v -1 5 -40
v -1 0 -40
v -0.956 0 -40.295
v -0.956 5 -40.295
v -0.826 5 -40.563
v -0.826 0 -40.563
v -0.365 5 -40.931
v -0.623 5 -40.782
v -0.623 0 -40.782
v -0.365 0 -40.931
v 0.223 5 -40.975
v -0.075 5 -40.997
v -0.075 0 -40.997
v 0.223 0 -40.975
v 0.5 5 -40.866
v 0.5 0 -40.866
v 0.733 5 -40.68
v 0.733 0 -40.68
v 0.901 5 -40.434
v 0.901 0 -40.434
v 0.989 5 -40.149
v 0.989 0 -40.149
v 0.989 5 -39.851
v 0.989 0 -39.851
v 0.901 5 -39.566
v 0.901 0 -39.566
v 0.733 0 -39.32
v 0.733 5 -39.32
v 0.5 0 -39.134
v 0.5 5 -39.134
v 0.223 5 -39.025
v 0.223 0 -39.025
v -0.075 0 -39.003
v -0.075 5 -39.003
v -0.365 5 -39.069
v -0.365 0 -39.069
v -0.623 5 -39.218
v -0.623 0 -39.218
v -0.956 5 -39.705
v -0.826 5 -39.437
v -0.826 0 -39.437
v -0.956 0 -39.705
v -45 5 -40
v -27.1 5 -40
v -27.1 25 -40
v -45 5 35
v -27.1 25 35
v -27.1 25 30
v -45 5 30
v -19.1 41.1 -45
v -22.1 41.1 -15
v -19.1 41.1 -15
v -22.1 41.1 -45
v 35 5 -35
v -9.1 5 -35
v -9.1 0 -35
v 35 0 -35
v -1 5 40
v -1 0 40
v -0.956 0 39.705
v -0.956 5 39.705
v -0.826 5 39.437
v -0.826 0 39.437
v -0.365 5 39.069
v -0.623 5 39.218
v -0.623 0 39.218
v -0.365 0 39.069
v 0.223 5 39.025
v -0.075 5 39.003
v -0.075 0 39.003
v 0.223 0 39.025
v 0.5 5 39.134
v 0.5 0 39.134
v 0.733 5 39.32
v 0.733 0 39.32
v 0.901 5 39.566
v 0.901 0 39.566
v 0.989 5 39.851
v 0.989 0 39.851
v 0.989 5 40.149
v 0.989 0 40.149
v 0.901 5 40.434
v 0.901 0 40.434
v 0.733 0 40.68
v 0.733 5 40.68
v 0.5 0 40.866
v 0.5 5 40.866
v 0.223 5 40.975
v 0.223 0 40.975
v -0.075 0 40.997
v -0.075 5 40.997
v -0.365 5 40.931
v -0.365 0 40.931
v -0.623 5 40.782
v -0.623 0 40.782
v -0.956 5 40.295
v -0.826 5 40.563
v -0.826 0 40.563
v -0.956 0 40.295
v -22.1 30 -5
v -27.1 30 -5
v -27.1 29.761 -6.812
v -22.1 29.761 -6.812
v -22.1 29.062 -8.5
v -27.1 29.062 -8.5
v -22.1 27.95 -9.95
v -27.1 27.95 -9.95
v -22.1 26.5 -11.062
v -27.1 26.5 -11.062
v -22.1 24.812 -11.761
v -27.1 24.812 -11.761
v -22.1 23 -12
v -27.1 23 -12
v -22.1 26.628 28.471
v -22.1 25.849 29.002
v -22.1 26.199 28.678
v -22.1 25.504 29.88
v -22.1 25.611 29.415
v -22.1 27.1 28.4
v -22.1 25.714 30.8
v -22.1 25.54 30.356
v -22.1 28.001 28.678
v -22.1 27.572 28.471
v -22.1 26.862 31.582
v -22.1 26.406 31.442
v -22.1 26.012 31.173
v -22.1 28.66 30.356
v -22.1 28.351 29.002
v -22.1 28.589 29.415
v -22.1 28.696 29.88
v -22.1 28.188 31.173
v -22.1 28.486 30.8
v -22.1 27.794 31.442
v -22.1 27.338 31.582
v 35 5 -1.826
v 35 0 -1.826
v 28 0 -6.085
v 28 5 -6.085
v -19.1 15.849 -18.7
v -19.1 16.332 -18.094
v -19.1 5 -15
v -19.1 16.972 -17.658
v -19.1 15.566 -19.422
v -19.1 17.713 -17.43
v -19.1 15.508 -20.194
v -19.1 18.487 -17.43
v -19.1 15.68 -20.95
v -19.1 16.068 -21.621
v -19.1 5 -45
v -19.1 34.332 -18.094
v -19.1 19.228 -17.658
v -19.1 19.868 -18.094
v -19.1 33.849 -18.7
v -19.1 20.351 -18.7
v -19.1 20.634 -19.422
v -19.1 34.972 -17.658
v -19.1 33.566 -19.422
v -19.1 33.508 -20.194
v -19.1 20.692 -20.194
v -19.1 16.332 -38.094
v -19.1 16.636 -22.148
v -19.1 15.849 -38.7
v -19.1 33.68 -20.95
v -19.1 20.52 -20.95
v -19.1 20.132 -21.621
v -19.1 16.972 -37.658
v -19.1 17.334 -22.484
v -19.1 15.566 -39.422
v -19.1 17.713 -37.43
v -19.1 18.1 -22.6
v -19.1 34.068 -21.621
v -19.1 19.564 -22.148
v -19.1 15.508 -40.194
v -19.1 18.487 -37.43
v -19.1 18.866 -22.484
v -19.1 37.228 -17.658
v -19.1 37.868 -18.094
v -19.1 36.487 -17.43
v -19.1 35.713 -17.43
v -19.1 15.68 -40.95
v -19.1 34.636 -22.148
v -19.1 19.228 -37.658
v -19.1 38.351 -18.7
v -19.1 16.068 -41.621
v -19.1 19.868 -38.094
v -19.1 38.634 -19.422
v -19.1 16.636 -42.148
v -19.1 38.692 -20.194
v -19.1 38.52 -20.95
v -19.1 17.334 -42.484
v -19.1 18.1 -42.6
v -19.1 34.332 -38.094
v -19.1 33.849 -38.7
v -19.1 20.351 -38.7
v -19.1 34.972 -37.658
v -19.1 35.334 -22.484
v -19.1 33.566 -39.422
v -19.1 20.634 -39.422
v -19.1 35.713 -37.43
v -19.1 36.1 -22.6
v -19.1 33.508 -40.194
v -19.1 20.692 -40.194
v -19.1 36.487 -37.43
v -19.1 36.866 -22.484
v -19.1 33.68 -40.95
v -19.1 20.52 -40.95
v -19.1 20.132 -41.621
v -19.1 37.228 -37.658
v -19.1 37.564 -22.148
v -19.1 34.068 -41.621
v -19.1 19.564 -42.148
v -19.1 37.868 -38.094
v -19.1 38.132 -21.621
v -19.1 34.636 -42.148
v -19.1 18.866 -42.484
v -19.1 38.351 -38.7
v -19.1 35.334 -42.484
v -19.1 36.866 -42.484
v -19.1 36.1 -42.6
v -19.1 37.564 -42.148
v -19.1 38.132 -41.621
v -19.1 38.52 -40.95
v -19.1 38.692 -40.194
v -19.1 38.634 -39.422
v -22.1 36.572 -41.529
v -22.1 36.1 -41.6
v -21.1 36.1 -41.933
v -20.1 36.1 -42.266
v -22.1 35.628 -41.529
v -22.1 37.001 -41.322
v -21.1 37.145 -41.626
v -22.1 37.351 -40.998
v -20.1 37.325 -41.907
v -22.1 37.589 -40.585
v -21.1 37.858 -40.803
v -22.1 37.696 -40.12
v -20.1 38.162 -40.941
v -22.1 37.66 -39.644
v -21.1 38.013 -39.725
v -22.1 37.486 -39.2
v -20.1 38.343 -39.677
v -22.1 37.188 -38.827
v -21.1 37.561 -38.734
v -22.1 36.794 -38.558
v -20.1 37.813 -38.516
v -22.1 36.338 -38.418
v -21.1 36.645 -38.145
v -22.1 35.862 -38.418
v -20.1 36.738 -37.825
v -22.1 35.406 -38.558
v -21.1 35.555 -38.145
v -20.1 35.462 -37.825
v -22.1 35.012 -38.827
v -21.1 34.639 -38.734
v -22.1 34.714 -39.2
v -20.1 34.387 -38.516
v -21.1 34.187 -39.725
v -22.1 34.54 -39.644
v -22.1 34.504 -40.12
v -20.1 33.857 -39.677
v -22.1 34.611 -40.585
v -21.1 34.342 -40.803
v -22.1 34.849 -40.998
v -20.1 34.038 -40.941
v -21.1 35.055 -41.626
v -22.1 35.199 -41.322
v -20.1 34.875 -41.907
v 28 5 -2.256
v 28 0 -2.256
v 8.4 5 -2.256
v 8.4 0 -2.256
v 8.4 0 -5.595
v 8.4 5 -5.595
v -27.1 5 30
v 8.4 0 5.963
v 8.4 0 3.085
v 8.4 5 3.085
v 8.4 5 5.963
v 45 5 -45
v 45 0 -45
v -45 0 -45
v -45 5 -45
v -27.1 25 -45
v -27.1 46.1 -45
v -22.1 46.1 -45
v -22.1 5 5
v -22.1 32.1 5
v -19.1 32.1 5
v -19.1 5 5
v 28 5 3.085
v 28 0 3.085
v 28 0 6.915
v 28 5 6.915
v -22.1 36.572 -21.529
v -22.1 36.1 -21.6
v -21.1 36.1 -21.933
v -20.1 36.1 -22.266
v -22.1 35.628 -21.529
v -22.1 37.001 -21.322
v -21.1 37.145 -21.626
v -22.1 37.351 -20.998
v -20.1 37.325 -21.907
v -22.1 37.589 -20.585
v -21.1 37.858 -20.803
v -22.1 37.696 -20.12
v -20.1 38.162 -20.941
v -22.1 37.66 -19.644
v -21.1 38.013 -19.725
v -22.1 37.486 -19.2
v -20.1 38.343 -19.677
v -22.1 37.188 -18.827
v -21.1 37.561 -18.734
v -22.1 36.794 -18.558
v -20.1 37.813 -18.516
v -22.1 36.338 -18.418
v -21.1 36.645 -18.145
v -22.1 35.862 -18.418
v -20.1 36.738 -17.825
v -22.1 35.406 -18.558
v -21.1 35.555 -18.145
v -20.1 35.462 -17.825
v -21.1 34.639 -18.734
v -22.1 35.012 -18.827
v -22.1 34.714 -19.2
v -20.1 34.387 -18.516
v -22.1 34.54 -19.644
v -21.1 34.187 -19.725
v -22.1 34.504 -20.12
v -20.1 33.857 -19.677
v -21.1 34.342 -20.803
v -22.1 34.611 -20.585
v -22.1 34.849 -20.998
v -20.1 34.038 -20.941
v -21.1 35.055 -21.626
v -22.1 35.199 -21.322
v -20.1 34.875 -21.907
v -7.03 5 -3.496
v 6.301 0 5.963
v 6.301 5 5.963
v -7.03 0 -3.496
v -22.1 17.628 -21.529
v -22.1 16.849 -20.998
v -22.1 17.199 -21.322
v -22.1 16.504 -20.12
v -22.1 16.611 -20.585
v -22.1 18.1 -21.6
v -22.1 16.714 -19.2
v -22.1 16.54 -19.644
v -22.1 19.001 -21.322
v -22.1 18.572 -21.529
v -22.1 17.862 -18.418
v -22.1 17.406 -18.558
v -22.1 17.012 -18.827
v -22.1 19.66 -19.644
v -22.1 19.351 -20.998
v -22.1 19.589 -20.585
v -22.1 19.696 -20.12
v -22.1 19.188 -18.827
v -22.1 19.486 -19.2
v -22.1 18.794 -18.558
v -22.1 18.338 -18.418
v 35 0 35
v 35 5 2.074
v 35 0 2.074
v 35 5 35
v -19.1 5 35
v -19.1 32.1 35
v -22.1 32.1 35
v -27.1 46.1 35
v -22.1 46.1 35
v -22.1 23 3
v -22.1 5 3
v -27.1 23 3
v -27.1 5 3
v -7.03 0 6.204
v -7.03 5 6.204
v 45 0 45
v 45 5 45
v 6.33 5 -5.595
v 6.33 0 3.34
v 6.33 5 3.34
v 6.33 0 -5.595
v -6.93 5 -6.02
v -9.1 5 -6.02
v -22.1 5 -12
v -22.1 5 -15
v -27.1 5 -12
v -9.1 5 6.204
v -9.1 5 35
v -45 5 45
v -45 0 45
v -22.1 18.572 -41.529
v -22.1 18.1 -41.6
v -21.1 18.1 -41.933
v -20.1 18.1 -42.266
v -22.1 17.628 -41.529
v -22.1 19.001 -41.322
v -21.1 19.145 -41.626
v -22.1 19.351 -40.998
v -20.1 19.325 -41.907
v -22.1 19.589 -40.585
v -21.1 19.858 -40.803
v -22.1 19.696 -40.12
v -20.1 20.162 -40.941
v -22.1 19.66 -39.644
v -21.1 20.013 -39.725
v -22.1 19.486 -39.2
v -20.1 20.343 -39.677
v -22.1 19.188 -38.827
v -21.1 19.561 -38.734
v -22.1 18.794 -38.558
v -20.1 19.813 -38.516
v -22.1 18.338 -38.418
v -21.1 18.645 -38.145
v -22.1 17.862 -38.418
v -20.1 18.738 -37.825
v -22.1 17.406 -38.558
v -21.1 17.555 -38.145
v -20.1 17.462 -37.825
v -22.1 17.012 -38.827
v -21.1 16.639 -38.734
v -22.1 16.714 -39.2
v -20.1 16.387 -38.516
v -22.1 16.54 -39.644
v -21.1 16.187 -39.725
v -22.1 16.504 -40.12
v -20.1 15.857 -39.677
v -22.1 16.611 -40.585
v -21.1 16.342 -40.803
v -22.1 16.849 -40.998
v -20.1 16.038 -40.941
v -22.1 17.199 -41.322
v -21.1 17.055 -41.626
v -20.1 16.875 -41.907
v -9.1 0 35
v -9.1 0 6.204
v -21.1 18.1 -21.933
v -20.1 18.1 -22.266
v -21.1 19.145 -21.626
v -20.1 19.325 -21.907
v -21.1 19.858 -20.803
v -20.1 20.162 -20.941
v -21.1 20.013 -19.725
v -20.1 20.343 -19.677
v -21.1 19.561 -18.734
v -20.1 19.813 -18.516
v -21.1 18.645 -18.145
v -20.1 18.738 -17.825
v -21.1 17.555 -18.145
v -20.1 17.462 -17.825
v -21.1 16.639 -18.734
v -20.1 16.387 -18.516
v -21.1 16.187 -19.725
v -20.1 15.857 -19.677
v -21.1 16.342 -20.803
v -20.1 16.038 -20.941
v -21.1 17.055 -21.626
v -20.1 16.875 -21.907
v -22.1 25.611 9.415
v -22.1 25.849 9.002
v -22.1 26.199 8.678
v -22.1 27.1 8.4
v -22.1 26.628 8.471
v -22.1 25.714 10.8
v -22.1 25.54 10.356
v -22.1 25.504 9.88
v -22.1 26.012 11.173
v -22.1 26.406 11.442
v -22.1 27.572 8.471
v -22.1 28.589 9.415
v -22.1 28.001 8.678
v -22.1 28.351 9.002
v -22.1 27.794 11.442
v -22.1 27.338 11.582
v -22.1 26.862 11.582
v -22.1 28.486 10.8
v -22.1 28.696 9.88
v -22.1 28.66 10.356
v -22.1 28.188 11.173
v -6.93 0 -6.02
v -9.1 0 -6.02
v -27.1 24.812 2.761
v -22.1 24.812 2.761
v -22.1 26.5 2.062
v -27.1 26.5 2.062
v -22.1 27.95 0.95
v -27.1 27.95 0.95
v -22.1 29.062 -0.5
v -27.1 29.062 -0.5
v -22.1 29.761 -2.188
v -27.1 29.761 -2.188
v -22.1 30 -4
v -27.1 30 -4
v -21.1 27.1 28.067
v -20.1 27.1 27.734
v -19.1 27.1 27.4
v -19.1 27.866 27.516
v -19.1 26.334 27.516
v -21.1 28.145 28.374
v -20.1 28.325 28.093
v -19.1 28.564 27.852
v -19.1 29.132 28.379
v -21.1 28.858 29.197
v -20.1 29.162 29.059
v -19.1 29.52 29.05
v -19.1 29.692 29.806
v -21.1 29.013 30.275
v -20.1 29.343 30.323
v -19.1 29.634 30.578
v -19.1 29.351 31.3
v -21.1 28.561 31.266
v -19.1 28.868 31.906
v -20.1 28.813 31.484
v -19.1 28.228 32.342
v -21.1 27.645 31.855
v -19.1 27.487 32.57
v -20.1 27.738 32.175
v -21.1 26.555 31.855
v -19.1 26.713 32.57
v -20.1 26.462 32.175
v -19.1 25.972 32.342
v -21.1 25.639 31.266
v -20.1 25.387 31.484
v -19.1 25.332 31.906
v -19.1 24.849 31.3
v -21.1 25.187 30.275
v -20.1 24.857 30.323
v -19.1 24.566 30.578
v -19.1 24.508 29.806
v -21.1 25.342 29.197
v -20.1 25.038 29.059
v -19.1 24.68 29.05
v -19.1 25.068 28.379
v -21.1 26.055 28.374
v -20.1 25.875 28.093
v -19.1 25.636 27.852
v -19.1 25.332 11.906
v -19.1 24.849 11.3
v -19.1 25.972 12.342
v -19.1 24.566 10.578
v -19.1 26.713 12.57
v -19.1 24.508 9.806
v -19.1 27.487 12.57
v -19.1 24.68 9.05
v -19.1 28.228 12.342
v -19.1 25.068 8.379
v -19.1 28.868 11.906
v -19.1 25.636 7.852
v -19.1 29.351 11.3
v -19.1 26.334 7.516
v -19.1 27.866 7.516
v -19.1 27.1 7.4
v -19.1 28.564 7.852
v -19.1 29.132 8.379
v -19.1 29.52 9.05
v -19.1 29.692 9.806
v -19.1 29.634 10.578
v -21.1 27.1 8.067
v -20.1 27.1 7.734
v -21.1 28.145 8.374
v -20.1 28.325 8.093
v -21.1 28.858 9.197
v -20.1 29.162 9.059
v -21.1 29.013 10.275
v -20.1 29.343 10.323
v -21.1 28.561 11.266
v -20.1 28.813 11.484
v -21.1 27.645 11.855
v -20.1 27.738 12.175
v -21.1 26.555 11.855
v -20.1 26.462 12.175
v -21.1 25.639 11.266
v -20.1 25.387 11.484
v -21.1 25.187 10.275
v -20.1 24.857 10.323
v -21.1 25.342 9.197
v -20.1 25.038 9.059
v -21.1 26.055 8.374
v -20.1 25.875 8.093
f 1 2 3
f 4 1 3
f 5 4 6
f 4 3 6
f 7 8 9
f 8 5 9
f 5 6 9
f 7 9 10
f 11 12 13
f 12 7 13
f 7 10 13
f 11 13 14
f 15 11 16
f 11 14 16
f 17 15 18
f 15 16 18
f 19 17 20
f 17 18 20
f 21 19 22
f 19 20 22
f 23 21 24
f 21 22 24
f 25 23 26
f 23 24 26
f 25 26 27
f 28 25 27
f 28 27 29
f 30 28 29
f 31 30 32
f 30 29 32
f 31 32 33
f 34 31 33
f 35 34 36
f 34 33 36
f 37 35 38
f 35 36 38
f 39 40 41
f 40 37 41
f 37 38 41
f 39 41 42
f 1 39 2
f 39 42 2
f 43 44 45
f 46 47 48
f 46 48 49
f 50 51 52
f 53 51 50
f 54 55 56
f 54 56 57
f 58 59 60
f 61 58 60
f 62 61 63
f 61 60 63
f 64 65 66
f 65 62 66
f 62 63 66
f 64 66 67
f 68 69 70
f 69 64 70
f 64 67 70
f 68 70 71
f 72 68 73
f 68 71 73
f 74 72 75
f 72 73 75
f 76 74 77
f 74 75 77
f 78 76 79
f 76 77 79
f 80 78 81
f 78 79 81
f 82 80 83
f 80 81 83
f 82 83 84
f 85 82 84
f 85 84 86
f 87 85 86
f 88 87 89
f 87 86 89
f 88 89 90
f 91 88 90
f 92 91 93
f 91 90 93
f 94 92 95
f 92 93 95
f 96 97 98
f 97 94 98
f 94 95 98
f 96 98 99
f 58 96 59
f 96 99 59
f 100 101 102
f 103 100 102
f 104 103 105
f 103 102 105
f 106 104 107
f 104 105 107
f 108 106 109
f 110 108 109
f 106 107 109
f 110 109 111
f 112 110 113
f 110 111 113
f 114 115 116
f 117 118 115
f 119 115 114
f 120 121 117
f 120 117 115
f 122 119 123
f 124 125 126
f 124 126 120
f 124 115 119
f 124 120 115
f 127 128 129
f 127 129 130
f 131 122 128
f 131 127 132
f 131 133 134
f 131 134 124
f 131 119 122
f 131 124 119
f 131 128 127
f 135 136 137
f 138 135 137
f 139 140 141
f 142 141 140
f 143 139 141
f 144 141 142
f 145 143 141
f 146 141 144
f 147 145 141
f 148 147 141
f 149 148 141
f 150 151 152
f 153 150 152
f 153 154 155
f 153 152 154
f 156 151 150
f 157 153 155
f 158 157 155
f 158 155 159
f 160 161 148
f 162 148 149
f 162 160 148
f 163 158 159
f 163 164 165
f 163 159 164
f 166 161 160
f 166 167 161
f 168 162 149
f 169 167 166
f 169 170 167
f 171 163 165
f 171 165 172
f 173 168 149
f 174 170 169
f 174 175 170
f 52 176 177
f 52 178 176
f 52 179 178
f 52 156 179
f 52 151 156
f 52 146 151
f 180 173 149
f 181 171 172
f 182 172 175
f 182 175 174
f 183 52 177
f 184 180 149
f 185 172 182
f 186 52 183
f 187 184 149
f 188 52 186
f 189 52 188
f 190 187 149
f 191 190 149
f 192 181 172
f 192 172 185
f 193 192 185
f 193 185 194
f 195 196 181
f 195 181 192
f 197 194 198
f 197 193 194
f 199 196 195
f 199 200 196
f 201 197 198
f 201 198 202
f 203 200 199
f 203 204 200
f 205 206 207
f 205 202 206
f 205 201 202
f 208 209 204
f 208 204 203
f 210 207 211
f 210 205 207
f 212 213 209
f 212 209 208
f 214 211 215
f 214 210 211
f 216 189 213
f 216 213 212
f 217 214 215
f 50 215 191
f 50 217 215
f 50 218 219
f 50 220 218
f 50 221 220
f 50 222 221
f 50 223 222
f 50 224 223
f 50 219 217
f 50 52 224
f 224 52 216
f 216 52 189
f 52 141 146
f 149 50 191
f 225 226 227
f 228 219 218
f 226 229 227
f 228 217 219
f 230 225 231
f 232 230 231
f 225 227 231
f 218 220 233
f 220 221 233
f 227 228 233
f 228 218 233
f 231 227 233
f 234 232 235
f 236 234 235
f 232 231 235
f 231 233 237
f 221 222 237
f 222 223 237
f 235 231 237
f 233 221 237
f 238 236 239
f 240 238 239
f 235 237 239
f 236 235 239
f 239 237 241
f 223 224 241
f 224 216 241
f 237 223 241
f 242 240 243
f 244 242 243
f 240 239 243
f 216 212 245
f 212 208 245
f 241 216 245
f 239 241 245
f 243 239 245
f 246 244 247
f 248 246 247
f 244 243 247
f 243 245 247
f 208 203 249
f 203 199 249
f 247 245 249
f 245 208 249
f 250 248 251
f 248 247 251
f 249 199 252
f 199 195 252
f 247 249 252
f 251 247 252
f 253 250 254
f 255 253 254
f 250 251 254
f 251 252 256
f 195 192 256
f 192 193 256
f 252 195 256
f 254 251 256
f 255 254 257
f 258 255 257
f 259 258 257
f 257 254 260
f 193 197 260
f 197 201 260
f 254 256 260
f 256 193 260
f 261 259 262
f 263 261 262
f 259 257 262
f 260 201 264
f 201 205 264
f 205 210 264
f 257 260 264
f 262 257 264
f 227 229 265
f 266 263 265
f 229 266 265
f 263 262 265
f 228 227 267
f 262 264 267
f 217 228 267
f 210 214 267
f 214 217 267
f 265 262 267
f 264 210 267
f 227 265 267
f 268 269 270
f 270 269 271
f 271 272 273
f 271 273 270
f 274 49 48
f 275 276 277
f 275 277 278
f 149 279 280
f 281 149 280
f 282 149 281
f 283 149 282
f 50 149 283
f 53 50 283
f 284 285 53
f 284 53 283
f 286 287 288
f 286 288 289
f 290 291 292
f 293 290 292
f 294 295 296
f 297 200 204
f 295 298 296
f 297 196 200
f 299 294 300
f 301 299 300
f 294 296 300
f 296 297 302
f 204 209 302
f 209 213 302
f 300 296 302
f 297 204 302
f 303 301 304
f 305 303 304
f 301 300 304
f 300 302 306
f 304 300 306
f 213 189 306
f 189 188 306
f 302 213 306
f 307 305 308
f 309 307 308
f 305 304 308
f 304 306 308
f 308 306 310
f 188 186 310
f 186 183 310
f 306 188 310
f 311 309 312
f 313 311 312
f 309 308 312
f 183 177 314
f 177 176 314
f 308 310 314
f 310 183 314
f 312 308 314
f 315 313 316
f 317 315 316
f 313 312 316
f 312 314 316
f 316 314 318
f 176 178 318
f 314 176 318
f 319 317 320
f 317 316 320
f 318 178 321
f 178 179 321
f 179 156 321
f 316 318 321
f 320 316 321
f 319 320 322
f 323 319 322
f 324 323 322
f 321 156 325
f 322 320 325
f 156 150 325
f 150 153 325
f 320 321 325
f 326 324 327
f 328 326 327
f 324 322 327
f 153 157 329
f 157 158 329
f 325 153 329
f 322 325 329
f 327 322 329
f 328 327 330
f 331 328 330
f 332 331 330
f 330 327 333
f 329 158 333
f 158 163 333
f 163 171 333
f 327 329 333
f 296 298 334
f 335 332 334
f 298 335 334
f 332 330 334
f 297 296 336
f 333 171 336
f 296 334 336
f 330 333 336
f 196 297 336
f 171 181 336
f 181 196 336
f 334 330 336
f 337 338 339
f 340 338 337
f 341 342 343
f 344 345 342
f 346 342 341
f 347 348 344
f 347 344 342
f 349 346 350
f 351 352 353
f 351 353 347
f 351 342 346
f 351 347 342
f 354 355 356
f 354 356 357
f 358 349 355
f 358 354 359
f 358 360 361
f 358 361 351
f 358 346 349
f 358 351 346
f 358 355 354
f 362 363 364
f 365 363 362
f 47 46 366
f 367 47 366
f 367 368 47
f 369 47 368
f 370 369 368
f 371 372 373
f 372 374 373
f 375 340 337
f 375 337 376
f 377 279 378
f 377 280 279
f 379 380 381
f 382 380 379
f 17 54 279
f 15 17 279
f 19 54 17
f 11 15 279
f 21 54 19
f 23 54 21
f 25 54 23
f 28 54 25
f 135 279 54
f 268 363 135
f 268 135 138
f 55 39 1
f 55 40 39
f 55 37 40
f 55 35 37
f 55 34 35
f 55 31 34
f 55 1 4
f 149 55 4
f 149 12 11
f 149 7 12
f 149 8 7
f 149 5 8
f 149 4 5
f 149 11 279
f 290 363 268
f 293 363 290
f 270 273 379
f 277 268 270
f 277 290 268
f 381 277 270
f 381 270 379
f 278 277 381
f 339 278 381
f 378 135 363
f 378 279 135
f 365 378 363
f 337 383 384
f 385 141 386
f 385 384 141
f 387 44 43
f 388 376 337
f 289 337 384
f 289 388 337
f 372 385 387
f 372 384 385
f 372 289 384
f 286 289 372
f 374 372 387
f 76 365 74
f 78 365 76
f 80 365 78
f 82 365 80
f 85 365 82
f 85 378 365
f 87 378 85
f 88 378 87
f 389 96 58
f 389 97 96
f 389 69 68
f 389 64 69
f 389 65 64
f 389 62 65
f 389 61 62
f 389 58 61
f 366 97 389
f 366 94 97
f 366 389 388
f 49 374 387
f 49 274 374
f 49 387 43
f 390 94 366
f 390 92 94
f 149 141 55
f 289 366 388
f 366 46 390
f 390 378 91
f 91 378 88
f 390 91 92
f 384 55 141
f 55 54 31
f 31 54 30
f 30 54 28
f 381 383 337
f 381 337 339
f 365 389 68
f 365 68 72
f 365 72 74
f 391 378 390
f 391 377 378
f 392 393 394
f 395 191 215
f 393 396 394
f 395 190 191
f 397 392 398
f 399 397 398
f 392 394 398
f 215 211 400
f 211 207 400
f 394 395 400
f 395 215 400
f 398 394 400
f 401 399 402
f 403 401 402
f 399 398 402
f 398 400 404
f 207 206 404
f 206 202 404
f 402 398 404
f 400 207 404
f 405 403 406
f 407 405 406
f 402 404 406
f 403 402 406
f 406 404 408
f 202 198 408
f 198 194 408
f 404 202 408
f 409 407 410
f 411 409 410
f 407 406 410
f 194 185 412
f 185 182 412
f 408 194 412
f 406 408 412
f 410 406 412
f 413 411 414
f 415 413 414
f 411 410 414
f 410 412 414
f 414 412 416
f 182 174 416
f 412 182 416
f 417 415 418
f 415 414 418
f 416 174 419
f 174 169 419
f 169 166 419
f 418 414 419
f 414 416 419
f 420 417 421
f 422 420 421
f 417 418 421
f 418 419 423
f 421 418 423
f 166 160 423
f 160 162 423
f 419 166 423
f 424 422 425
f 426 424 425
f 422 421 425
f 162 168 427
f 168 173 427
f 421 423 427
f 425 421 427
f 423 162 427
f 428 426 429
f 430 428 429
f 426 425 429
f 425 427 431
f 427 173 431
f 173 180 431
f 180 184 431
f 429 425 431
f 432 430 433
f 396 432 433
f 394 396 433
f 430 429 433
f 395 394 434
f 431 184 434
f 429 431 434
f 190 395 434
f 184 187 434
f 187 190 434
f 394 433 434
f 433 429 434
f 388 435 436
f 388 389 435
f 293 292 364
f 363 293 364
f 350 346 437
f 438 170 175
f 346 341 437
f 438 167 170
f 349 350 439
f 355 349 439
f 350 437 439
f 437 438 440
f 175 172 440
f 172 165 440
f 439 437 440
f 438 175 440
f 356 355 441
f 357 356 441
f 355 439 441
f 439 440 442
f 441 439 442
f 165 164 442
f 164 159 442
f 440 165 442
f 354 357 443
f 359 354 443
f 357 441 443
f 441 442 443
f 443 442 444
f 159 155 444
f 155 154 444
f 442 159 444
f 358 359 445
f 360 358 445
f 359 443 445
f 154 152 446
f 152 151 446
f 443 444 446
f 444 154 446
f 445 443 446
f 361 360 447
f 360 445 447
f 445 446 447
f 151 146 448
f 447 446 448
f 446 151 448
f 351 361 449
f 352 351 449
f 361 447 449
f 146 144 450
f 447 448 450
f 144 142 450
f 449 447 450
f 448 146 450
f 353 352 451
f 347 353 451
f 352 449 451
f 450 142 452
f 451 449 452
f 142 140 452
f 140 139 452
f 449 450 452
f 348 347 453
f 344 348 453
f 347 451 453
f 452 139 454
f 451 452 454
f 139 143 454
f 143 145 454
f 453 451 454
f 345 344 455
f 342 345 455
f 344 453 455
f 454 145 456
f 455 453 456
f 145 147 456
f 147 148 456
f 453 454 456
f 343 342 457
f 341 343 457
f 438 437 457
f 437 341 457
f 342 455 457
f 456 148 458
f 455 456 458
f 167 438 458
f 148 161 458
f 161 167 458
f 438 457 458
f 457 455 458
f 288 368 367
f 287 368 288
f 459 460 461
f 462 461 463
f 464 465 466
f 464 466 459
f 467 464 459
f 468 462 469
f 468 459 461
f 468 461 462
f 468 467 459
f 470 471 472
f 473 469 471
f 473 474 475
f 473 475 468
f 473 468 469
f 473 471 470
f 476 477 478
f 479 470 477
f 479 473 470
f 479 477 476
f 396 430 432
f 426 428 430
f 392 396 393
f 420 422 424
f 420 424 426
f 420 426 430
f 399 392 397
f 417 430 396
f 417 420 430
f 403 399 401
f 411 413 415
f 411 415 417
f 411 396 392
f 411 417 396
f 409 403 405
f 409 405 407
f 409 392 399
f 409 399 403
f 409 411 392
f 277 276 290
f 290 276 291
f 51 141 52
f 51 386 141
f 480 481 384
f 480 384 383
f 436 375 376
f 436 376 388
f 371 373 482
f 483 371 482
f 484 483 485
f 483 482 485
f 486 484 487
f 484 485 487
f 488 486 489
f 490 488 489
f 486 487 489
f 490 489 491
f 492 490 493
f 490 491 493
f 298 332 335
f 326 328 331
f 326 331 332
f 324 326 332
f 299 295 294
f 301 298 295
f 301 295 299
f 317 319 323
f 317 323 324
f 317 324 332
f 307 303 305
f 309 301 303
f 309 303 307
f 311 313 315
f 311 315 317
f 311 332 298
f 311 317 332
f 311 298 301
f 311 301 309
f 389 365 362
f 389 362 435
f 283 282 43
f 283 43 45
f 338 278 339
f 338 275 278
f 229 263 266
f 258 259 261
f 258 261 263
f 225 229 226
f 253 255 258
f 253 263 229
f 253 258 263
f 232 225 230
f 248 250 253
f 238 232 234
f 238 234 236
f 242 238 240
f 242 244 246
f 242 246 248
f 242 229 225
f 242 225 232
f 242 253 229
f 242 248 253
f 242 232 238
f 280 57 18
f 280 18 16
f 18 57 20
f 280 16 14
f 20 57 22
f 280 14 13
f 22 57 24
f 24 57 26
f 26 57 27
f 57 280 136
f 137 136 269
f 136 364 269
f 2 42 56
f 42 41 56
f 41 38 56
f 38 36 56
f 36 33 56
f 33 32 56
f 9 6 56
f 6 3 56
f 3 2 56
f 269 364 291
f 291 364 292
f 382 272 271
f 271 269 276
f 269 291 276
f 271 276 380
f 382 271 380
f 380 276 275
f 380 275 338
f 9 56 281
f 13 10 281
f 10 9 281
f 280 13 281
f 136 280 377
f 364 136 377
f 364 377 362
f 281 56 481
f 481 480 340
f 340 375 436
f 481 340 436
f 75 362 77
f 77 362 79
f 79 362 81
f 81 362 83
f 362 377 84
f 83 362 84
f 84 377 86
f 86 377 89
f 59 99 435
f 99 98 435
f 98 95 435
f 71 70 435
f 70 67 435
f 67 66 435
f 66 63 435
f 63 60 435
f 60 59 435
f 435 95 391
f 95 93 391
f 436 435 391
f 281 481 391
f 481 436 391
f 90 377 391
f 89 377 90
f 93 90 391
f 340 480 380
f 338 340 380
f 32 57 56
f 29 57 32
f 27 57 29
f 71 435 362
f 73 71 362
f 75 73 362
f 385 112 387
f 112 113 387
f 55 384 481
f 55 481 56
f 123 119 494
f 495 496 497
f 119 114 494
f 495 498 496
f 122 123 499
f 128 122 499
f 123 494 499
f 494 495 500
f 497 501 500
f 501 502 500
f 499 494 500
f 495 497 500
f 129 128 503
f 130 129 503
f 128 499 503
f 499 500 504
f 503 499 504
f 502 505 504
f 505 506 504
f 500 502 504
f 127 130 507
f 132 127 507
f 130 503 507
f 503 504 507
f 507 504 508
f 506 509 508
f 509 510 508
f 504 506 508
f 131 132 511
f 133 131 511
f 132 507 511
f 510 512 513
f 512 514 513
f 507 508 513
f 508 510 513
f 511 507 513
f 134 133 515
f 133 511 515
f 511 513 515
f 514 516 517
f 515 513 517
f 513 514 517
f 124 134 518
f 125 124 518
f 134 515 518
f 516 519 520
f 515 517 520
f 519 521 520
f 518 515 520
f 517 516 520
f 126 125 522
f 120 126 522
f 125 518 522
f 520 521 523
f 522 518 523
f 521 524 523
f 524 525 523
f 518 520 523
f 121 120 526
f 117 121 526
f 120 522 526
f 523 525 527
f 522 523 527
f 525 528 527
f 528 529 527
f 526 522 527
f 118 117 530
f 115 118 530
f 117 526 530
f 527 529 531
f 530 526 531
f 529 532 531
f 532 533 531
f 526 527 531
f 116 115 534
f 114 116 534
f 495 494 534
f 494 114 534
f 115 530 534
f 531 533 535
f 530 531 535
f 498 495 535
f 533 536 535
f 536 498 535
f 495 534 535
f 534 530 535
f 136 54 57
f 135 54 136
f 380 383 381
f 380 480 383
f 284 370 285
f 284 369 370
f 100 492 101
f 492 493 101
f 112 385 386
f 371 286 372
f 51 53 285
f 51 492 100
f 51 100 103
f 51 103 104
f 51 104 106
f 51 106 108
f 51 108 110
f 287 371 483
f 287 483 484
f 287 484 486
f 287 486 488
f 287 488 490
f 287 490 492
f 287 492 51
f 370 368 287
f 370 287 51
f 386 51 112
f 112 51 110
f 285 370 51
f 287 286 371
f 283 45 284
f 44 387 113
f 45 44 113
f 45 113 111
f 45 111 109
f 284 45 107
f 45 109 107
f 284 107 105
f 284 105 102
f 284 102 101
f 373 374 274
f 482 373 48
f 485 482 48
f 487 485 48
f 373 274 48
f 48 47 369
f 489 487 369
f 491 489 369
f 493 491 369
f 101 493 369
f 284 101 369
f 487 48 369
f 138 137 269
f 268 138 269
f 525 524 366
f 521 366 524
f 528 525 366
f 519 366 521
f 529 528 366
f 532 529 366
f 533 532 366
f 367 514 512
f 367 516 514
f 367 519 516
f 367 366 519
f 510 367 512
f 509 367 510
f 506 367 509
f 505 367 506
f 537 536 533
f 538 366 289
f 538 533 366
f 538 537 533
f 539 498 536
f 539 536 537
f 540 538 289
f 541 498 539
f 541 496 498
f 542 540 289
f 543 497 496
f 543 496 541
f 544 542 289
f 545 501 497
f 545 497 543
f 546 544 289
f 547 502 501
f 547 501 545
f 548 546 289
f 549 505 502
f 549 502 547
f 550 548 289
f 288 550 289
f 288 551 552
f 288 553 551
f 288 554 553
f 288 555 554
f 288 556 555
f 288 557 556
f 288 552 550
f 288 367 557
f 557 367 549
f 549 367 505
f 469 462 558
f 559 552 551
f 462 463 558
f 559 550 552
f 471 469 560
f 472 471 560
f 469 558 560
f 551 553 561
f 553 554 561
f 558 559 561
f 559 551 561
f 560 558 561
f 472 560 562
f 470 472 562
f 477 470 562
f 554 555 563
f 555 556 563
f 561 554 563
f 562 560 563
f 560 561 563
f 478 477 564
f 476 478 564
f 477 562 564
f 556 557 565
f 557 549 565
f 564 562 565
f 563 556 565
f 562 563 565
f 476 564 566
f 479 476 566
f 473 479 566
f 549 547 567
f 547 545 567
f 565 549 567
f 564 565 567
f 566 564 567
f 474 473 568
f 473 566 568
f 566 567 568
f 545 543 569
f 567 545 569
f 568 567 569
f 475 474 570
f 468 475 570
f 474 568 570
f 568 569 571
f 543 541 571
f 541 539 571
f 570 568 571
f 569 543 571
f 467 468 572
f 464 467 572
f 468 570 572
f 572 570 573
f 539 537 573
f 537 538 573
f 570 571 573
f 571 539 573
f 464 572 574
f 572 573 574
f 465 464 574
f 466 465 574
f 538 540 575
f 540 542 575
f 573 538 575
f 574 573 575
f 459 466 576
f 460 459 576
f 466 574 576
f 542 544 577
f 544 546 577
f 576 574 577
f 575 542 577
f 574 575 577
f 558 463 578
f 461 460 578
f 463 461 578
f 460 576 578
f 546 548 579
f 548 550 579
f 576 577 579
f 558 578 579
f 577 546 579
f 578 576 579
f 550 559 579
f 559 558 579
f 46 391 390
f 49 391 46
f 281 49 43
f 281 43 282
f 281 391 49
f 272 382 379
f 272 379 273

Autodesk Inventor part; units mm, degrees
ref_plane "Arbeitsebene2" through (-75, 27.1, 0) normal (0, 0, 1) x (0, 1, 0)
sketch "center1" plane through (-75, 27.1, 0) normal (0, 0, 1) x (0, 1, 0)
  line L0 (-173.891, -75) -> (168.1592, -75)
  line L1 (0, 344.1359) -> (0, -385.7952)
  point P0 (-27.1, -75)
ref_plane "Arbeitsebene3" through (0, 99.4, -2.4) normal (-1, 0, 0) x (0, 0, 1)
sketch "center2" plane through (0, 99.4, -2.4) normal (-1, 0, 0) x (0, 0, 1)
  line L0 (184.8129, -72.3) -> (-258.9785, -72.3)
  point P0 (2.4, -99.4)
sketch "Groundplane" plane through (0, 0, 0) normal (0, 1, 0) x (-1, 0, 0)
  line L0 (45, 45) -> (-45, 45) construction
  line L1 (-45, 45) -> (-45, -45) construction
  line L2 (-45, -45) -> (45, -45) construction
  line L3 (45, -45) -> (45, 45) construction
  line L4 (1, 45) -> (-1, 45) construction
  line L5 (-1, 45) -> (-1, 40) construction
  line L6 (-1, 40) -> (1, 40) construction
  line L7 (1, 40) -> (1, 45) construction
  arc A0 (-1, 40) -> (1, 40) centre (0, 40) ccw construction
  line L8 (1, -45) -> (-1, -45) construction
  line L9 (-1, -45) -> (-1, -40) construction
  line L10 (-1, -40) -> (1, -40) construction
  line L11 (1, -40) -> (1, -45) construction
  arc A1 (1, -40) -> (-1, -40) centre (0, -40) ccw construction
  line L12 (0, -350.1368) -> (0, 271.1712) projected
  point P0 (0, 0)
  point P1 (0, -45)
  dimension "d5" = 2
  dimension "d6" = 5
  dimension "d7" = 2
  dimension "d8" = 5
  dimension "d9" = 90
  dimension "d63" = 90
  dimension "d76" = 45
sketch "Hallsensor" plane through (0, 0, 0) normal (1, 0, 0) x (0, 1, 0)
  line L0 (22.1, 0) -> (32.1, 0) construction
  line L1 (32.1, 0) -> (32.1, 20) construction
  line L2 (32.1, 20) -> (22.1, 20) construction
  line L3 (22.1, 20) -> (22.1, 0) construction
  line L4 (27.1, 182.4129) -> (27.1, -261.3785) construction
  line L5 (-146.791, 0) -> (195.2592, 0) construction
  line L6 (31.1, 1) -> (33.1, 1)
  line L7 (33.1, 1) -> (33.1, -1)
  line L8 (33.1, -1) -> (31.1, -1)
  line L9 (31.1, -1) -> (31.1, 1)
  line L10 (31.1, 1) -> (33.1, -1) construction
  line L11 (33.1, 1) -> (31.1, -1) construction
  line L12 (21.1, 1) -> (23.1, 1)
  line L13 (23.1, 1) -> (23.1, -1)
  line L14 (23.1, -1) -> (21.1, -1)
  line L15 (21.1, -1) -> (21.1, 1)
  line L16 (21.1, 1) -> (23.1, -1) construction
  line L17 (23.1, 1) -> (21.1, -1) construction
  line L18 (31.1, 21) -> (33.1, 21)
  line L19 (33.1, 21) -> (33.1, 19)
  line L20 (33.1, 19) -> (31.1, 19)
  line L21 (31.1, 19) -> (31.1, 21)
  line L22 (31.1, 21) -> (33.1, 19) construction
  line L23 (33.1, 21) -> (31.1, 19) construction
  line L24 (21.1, 21) -> (23.1, 21)
  line L25 (23.1, 21) -> (23.1, 19)
  line L26 (23.1, 19) -> (21.1, 19)
  line L27 (21.1, 19) -> (21.1, 21)
  line L28 (21.1, 21) -> (23.1, 19) construction
  line L29 (23.1, 21) -> (21.1, 19) construction
  line L30 (36.1, 30) -> (18.1, 30) construction
  line L31 (18.1, 30) -> (18.1, -20) construction
  line L32 (18.1, -20) -> (36.1, -20) construction
  line L33 (36.1, -20) -> (36.1, 30) construction
  circle A0 centre (27.1, 30) radius 1.6
  circle A1 centre (36.1, -20) radius 1.6
  circle A2 centre (18.1, -20) radius 1.6
  point P0 (0, 0)
  dimension "d127" = 20
  dimension "d128" = 5
  dimension "d129" = 5
  dimension "d130" = 2
  dimension "d131" = 20
  dimension "d132" = 4
  dimension "d133" = 4
  dimension "d134" = 10
  dimension "d135" = 3.2
ref_plane "Arbeitsebene1" through (-27.1, 0, 0) normal (1, 0, 0) x (0, 1, 0)
sketch "Montagepunkte" plane through (-27.1, 0, 0) normal (1, 0, 0) x (0, 1, 0)
  line L0 (27.1, 10) -> (27.1, -45.0561) construction
  line L1 (46.1, -45) -> (0, -45)
  line L2 (0, -45) -> (0, 35)
  line L3 (0, 35) -> (46.1, 35)
  line L4 (46.1, 35) -> (46.1, -45)
  circle A0 centre (36.1, -20) radius 1.6 projected
  circle A1 centre (18.1, -20) radius 1.6 projected
  circle A2 centre (27.1, 30) radius 1.6 projected
  line L5 (36.1, -20) -> (18.1, -20) construction
  line L6 (18.1, -20) -> (18.1, -40) construction
  line L7 (18.1, -40) -> (36.1, -40) construction
  line L8 (36.1, -40) -> (36.1, -20) construction
  line L9 (27.1, 30) -> (27.1, 10) construction
  circle A3 centre (27.1, 10) radius 1.6
  circle A4 centre (36.1, -40) radius 1.6
  circle A5 centre (18.1, -40) radius 1.6
  point P0 (0, 0)
  point P1 (0, 0)
  point P2 (1.45, 0)
  dimension "d136" = 20
  dimension "d137" = 20
  dimension "d138" = 3.2
  dimension "d139" = 5
  dimension "d140" = 5
  dimension "d141" = 10
sketch "Skizze10" plane through (-27.1, 0, 0) normal (1, 0, 0) x (0, 1, 0)
  line L0 (46.1, -45) -> (0, -45) projected
  line L1 (0, -45) -> (0, 35) projected
  line L2 (0, 35) -> (46.1, 35) projected
  line L3 (46.1, 35) -> (46.1, -45) projected
  point P0 (0, 0)
extrude "Extrusion5" add sketch "Skizze10" along normal blind 5
sketch "Skizze11" plane through (-22.1, 0, 0) normal (1, 0, 0) x (0, 0, -1)
  line L0 (-35, 0) -> (45, 0) projected
  circle A0 centre (40, 36.1) radius 1.6 projected
  circle A1 centre (20, 36.1) radius 1.6 projected
  circle A2 centre (20, 18.1) radius 1.6 projected
  circle A3 centre (40, 18.1) radius 1.6 projected
  circle A4 centre (-10, 27.1) radius 1.6 projected
  circle A5 centre (-30, 27.1) radius 1.6 projected
  line L1 (-35, 32.1) -> (-5, 32.1)
  line L2 (-5, 32.1) -> (-5, 0)
  line L3 (-5, 0) -> (-35, 0)
  line L4 (-35, 0) -> (-35, 32.1)
  line L5 (15, 41.1) -> (45, 41.1)
  line L6 (45, 41.1) -> (45, 0)
  line L7 (45, 0) -> (15, 0)
  line L8 (15, 0) -> (15, 41.1)
  point P0 (0, 0)
  dimension "d142" = 5
  dimension "d143" = 5
  dimension "d144" = 5
  dimension "d145" = 5
  dimension "d146" = 5
  dimension "d147" = 5
extrude "Extrusion6" add sketch "Skizze11" along normal blind 3
chamfer "Fase3" distance 1 distance2 3 4 edges at (-19.1, 36.1, -18.4) (-19.1, 36.1, -38.4) (-19.1, 18.1, -38.4) (-19.1, 18.1, -18.4) measured on face at (-19.1, 5.5944, -26.9696)
chamfer "Fase4" distance 1 distance2 3 2 edges at (-19.1, 27.1, 31.6) (-19.1, 27.1, 11.6) measured on face at (-19.1, 8.5944, 16.9696)
sketch "Skizze12" plane through (0, 0, 0) normal (0, 1, 0) x (-1, 0, 0)
  line L0 (-45, 45) -> (-45, -45) construction
  line L1 (-45, -45) -> (45, -45) construction
  line L2 (45, -45) -> (45, 45) construction
  line L3 (45, 45) -> (-45, 45) construction
  arc A0 (1, -40) -> (-1, -40) centre (0, -40) ccw construction
  arc A1 (-1, 40) -> (1, 40) centre (0, 40) ccw construction
  circle A2 centre (0, 40) radius 1
  circle A3 centre (0, -40) radius 1
  line L4 (45, -45) -> (-45, -45)
  line L5 (-45, -45) -> (-45, 45)
  line L6 (-45, 45) -> (45, 45)
  line L7 (45, 45) -> (45, -45)
  point P0 (0, 0)
extrude "Extrusion7" add sketch "Skizze12" along normal blind 5
sketch "Skizze13" plane through (-27.1, 46.1, 35) normal (0, 0, 1) x (1, 0, 0)
  line L0 (0, -21.1) -> (-17.9, -41.1)
  line L1 (-17.9, -41.1) -> (0, -41.1)
  line L2 (0, -41.1) -> (0, -21.1)
  point P0 (27.1, -46.1)
  dimension "d108" = 20
extrude "Extrusion8" add sketch "Skizze13" against normal blind 5
sketch "Skizze14" plane through (-19.1, 46.1, -45) normal (0, 0, -1) x (-1, 0, 0)
  line L0 (25.9, -41.1) -> (8, -41.1) projected
  line L1 (25.9, -41.1) -> (8, -21.1) projected
  line L2 (8, -41.1) -> (8, -21.1) projected
  point P0 (-19.1, -46.1)
extrude "Extrusion9" add sketch "Skizze14" against normal blind 5
sketch "Skizze15" plane through (-27.1, 0, 0) normal (-1, 0, 0) x (0, 0, 1)
  line L0 (-12, 5) -> (3, 5)
  line L1 (3, 5) -> (3, 23)
  line L2 (-4, 30) -> (-5, 30)
  line L3 (-12, 23) -> (-12, 5)
  line L4 (-45, 5) -> (35, 5) projected
  arc A0 (-5, 30) -> (-12, 23) centre (-5, 23) ccw
  arc A1 (3, 23) -> (-4, 30) centre (-4, 23) ccw
  point P0 (0, 0)
  point P1 (3, 30)
  point P2 (-12, 30)
  point P3 (-40, 5)
  point P4 (30, 5)
  dimension "d114" = 15
  dimension "d115" = 25
  dimension "d116" = 7
extrude "Extrusion10" cut sketch "Skizze15" against normal through all
sketch "Skizze16" plane through (0, 5, 0) normal (0, 1, 0) x (1, 0, 0)
  line L0 (-9.1, 35) -> (35, 35)
  line L1 (35, 35) -> (35, -35)
  line L2 (35, -35) -> (-9.1, -35)
  line L3 (-9.1, -35) -> (-9.1, 35)
  line L4 (45, 45) -> (-19.1, 45) projected
  line L5 (45, -45) -> (45, 45) projected
  line L6 (-45, -45) -> (45, -45) projected
  line L7 (-19.1, -35) -> (-19.1, -5) construction
  point P0 (0, 0)
  dimension "d119" = 10
  dimension "d120" = 10
  dimension "d121" = 10
  dimension "d148" = 10
extrude "Extrusion11" cut sketch "Skizze16" against normal through all
sketch "Skizze17" plane through (-45, 0, 45) normal (0, -1, 0) x (1, 0, 0)
  line L0 (35.9, -80) -> (35.9, -10) construction
  line L1 (83, -45) -> (73, -51.0852)
  line L2 (73, -51.0852) -> (73, -47.2557)
  line L3 (73, -47.2557) -> (53, -47.2557)
  line L4 (53, -47.2557) -> (53, -41.9148)
  line L5 (53, -41.9148) -> (73, -41.9148)
  line L6 (73, -41.9148) -> (73, -38.0852)
  line L7 (73, -38.0852) -> (83, -45)
  line L8 (-520.1221, -45) -> (501.7814, -45) projected
  line L9 (35.9, -38.7956) -> (35.9, -51.0201)
  line L10 (35.9, -51.0201) -> (38.0698, -51.0201)
  line L11 (38.0698, -51.0201) -> (51.3295, -41.6603)
  line L12 (51.3295, -41.6603) -> (51.3295, -50.5946)
  line L13 (51.3295, -50.5946) -> (53.4, -50.5946)
  line L14 (53.4, -50.5946) -> (53.4, -39.0367)
  line L15 (53.4, -39.0367) -> (51.3011, -39.0367)
  line L16 (51.3011, -39.0367) -> (37.9705, -48.4957)
  line L17 (37.9705, -48.4957) -> (37.9705, -38.7956)
  line L18 (37.9705, -38.7956) -> (35.9, -38.7956)
  point P0 (45, -45)
extrude "Extrusion12" add sketch "Skizze17" against normal up to surface (5 mm away) contours L8 L14 L5 L6 L7 | L1 L2 L3 L14 L8 | L14 L3 L4 L8 | L8 L4 L5 L14 | L8 L12 L11 L16 L15 L14 L5 L4 | L4 L3 L14 L13 L12 L8 | L11 L10 L9 L8 L17 L16 | L8 L9 L18 L17
properties part number "HallSensor_Halterung"
